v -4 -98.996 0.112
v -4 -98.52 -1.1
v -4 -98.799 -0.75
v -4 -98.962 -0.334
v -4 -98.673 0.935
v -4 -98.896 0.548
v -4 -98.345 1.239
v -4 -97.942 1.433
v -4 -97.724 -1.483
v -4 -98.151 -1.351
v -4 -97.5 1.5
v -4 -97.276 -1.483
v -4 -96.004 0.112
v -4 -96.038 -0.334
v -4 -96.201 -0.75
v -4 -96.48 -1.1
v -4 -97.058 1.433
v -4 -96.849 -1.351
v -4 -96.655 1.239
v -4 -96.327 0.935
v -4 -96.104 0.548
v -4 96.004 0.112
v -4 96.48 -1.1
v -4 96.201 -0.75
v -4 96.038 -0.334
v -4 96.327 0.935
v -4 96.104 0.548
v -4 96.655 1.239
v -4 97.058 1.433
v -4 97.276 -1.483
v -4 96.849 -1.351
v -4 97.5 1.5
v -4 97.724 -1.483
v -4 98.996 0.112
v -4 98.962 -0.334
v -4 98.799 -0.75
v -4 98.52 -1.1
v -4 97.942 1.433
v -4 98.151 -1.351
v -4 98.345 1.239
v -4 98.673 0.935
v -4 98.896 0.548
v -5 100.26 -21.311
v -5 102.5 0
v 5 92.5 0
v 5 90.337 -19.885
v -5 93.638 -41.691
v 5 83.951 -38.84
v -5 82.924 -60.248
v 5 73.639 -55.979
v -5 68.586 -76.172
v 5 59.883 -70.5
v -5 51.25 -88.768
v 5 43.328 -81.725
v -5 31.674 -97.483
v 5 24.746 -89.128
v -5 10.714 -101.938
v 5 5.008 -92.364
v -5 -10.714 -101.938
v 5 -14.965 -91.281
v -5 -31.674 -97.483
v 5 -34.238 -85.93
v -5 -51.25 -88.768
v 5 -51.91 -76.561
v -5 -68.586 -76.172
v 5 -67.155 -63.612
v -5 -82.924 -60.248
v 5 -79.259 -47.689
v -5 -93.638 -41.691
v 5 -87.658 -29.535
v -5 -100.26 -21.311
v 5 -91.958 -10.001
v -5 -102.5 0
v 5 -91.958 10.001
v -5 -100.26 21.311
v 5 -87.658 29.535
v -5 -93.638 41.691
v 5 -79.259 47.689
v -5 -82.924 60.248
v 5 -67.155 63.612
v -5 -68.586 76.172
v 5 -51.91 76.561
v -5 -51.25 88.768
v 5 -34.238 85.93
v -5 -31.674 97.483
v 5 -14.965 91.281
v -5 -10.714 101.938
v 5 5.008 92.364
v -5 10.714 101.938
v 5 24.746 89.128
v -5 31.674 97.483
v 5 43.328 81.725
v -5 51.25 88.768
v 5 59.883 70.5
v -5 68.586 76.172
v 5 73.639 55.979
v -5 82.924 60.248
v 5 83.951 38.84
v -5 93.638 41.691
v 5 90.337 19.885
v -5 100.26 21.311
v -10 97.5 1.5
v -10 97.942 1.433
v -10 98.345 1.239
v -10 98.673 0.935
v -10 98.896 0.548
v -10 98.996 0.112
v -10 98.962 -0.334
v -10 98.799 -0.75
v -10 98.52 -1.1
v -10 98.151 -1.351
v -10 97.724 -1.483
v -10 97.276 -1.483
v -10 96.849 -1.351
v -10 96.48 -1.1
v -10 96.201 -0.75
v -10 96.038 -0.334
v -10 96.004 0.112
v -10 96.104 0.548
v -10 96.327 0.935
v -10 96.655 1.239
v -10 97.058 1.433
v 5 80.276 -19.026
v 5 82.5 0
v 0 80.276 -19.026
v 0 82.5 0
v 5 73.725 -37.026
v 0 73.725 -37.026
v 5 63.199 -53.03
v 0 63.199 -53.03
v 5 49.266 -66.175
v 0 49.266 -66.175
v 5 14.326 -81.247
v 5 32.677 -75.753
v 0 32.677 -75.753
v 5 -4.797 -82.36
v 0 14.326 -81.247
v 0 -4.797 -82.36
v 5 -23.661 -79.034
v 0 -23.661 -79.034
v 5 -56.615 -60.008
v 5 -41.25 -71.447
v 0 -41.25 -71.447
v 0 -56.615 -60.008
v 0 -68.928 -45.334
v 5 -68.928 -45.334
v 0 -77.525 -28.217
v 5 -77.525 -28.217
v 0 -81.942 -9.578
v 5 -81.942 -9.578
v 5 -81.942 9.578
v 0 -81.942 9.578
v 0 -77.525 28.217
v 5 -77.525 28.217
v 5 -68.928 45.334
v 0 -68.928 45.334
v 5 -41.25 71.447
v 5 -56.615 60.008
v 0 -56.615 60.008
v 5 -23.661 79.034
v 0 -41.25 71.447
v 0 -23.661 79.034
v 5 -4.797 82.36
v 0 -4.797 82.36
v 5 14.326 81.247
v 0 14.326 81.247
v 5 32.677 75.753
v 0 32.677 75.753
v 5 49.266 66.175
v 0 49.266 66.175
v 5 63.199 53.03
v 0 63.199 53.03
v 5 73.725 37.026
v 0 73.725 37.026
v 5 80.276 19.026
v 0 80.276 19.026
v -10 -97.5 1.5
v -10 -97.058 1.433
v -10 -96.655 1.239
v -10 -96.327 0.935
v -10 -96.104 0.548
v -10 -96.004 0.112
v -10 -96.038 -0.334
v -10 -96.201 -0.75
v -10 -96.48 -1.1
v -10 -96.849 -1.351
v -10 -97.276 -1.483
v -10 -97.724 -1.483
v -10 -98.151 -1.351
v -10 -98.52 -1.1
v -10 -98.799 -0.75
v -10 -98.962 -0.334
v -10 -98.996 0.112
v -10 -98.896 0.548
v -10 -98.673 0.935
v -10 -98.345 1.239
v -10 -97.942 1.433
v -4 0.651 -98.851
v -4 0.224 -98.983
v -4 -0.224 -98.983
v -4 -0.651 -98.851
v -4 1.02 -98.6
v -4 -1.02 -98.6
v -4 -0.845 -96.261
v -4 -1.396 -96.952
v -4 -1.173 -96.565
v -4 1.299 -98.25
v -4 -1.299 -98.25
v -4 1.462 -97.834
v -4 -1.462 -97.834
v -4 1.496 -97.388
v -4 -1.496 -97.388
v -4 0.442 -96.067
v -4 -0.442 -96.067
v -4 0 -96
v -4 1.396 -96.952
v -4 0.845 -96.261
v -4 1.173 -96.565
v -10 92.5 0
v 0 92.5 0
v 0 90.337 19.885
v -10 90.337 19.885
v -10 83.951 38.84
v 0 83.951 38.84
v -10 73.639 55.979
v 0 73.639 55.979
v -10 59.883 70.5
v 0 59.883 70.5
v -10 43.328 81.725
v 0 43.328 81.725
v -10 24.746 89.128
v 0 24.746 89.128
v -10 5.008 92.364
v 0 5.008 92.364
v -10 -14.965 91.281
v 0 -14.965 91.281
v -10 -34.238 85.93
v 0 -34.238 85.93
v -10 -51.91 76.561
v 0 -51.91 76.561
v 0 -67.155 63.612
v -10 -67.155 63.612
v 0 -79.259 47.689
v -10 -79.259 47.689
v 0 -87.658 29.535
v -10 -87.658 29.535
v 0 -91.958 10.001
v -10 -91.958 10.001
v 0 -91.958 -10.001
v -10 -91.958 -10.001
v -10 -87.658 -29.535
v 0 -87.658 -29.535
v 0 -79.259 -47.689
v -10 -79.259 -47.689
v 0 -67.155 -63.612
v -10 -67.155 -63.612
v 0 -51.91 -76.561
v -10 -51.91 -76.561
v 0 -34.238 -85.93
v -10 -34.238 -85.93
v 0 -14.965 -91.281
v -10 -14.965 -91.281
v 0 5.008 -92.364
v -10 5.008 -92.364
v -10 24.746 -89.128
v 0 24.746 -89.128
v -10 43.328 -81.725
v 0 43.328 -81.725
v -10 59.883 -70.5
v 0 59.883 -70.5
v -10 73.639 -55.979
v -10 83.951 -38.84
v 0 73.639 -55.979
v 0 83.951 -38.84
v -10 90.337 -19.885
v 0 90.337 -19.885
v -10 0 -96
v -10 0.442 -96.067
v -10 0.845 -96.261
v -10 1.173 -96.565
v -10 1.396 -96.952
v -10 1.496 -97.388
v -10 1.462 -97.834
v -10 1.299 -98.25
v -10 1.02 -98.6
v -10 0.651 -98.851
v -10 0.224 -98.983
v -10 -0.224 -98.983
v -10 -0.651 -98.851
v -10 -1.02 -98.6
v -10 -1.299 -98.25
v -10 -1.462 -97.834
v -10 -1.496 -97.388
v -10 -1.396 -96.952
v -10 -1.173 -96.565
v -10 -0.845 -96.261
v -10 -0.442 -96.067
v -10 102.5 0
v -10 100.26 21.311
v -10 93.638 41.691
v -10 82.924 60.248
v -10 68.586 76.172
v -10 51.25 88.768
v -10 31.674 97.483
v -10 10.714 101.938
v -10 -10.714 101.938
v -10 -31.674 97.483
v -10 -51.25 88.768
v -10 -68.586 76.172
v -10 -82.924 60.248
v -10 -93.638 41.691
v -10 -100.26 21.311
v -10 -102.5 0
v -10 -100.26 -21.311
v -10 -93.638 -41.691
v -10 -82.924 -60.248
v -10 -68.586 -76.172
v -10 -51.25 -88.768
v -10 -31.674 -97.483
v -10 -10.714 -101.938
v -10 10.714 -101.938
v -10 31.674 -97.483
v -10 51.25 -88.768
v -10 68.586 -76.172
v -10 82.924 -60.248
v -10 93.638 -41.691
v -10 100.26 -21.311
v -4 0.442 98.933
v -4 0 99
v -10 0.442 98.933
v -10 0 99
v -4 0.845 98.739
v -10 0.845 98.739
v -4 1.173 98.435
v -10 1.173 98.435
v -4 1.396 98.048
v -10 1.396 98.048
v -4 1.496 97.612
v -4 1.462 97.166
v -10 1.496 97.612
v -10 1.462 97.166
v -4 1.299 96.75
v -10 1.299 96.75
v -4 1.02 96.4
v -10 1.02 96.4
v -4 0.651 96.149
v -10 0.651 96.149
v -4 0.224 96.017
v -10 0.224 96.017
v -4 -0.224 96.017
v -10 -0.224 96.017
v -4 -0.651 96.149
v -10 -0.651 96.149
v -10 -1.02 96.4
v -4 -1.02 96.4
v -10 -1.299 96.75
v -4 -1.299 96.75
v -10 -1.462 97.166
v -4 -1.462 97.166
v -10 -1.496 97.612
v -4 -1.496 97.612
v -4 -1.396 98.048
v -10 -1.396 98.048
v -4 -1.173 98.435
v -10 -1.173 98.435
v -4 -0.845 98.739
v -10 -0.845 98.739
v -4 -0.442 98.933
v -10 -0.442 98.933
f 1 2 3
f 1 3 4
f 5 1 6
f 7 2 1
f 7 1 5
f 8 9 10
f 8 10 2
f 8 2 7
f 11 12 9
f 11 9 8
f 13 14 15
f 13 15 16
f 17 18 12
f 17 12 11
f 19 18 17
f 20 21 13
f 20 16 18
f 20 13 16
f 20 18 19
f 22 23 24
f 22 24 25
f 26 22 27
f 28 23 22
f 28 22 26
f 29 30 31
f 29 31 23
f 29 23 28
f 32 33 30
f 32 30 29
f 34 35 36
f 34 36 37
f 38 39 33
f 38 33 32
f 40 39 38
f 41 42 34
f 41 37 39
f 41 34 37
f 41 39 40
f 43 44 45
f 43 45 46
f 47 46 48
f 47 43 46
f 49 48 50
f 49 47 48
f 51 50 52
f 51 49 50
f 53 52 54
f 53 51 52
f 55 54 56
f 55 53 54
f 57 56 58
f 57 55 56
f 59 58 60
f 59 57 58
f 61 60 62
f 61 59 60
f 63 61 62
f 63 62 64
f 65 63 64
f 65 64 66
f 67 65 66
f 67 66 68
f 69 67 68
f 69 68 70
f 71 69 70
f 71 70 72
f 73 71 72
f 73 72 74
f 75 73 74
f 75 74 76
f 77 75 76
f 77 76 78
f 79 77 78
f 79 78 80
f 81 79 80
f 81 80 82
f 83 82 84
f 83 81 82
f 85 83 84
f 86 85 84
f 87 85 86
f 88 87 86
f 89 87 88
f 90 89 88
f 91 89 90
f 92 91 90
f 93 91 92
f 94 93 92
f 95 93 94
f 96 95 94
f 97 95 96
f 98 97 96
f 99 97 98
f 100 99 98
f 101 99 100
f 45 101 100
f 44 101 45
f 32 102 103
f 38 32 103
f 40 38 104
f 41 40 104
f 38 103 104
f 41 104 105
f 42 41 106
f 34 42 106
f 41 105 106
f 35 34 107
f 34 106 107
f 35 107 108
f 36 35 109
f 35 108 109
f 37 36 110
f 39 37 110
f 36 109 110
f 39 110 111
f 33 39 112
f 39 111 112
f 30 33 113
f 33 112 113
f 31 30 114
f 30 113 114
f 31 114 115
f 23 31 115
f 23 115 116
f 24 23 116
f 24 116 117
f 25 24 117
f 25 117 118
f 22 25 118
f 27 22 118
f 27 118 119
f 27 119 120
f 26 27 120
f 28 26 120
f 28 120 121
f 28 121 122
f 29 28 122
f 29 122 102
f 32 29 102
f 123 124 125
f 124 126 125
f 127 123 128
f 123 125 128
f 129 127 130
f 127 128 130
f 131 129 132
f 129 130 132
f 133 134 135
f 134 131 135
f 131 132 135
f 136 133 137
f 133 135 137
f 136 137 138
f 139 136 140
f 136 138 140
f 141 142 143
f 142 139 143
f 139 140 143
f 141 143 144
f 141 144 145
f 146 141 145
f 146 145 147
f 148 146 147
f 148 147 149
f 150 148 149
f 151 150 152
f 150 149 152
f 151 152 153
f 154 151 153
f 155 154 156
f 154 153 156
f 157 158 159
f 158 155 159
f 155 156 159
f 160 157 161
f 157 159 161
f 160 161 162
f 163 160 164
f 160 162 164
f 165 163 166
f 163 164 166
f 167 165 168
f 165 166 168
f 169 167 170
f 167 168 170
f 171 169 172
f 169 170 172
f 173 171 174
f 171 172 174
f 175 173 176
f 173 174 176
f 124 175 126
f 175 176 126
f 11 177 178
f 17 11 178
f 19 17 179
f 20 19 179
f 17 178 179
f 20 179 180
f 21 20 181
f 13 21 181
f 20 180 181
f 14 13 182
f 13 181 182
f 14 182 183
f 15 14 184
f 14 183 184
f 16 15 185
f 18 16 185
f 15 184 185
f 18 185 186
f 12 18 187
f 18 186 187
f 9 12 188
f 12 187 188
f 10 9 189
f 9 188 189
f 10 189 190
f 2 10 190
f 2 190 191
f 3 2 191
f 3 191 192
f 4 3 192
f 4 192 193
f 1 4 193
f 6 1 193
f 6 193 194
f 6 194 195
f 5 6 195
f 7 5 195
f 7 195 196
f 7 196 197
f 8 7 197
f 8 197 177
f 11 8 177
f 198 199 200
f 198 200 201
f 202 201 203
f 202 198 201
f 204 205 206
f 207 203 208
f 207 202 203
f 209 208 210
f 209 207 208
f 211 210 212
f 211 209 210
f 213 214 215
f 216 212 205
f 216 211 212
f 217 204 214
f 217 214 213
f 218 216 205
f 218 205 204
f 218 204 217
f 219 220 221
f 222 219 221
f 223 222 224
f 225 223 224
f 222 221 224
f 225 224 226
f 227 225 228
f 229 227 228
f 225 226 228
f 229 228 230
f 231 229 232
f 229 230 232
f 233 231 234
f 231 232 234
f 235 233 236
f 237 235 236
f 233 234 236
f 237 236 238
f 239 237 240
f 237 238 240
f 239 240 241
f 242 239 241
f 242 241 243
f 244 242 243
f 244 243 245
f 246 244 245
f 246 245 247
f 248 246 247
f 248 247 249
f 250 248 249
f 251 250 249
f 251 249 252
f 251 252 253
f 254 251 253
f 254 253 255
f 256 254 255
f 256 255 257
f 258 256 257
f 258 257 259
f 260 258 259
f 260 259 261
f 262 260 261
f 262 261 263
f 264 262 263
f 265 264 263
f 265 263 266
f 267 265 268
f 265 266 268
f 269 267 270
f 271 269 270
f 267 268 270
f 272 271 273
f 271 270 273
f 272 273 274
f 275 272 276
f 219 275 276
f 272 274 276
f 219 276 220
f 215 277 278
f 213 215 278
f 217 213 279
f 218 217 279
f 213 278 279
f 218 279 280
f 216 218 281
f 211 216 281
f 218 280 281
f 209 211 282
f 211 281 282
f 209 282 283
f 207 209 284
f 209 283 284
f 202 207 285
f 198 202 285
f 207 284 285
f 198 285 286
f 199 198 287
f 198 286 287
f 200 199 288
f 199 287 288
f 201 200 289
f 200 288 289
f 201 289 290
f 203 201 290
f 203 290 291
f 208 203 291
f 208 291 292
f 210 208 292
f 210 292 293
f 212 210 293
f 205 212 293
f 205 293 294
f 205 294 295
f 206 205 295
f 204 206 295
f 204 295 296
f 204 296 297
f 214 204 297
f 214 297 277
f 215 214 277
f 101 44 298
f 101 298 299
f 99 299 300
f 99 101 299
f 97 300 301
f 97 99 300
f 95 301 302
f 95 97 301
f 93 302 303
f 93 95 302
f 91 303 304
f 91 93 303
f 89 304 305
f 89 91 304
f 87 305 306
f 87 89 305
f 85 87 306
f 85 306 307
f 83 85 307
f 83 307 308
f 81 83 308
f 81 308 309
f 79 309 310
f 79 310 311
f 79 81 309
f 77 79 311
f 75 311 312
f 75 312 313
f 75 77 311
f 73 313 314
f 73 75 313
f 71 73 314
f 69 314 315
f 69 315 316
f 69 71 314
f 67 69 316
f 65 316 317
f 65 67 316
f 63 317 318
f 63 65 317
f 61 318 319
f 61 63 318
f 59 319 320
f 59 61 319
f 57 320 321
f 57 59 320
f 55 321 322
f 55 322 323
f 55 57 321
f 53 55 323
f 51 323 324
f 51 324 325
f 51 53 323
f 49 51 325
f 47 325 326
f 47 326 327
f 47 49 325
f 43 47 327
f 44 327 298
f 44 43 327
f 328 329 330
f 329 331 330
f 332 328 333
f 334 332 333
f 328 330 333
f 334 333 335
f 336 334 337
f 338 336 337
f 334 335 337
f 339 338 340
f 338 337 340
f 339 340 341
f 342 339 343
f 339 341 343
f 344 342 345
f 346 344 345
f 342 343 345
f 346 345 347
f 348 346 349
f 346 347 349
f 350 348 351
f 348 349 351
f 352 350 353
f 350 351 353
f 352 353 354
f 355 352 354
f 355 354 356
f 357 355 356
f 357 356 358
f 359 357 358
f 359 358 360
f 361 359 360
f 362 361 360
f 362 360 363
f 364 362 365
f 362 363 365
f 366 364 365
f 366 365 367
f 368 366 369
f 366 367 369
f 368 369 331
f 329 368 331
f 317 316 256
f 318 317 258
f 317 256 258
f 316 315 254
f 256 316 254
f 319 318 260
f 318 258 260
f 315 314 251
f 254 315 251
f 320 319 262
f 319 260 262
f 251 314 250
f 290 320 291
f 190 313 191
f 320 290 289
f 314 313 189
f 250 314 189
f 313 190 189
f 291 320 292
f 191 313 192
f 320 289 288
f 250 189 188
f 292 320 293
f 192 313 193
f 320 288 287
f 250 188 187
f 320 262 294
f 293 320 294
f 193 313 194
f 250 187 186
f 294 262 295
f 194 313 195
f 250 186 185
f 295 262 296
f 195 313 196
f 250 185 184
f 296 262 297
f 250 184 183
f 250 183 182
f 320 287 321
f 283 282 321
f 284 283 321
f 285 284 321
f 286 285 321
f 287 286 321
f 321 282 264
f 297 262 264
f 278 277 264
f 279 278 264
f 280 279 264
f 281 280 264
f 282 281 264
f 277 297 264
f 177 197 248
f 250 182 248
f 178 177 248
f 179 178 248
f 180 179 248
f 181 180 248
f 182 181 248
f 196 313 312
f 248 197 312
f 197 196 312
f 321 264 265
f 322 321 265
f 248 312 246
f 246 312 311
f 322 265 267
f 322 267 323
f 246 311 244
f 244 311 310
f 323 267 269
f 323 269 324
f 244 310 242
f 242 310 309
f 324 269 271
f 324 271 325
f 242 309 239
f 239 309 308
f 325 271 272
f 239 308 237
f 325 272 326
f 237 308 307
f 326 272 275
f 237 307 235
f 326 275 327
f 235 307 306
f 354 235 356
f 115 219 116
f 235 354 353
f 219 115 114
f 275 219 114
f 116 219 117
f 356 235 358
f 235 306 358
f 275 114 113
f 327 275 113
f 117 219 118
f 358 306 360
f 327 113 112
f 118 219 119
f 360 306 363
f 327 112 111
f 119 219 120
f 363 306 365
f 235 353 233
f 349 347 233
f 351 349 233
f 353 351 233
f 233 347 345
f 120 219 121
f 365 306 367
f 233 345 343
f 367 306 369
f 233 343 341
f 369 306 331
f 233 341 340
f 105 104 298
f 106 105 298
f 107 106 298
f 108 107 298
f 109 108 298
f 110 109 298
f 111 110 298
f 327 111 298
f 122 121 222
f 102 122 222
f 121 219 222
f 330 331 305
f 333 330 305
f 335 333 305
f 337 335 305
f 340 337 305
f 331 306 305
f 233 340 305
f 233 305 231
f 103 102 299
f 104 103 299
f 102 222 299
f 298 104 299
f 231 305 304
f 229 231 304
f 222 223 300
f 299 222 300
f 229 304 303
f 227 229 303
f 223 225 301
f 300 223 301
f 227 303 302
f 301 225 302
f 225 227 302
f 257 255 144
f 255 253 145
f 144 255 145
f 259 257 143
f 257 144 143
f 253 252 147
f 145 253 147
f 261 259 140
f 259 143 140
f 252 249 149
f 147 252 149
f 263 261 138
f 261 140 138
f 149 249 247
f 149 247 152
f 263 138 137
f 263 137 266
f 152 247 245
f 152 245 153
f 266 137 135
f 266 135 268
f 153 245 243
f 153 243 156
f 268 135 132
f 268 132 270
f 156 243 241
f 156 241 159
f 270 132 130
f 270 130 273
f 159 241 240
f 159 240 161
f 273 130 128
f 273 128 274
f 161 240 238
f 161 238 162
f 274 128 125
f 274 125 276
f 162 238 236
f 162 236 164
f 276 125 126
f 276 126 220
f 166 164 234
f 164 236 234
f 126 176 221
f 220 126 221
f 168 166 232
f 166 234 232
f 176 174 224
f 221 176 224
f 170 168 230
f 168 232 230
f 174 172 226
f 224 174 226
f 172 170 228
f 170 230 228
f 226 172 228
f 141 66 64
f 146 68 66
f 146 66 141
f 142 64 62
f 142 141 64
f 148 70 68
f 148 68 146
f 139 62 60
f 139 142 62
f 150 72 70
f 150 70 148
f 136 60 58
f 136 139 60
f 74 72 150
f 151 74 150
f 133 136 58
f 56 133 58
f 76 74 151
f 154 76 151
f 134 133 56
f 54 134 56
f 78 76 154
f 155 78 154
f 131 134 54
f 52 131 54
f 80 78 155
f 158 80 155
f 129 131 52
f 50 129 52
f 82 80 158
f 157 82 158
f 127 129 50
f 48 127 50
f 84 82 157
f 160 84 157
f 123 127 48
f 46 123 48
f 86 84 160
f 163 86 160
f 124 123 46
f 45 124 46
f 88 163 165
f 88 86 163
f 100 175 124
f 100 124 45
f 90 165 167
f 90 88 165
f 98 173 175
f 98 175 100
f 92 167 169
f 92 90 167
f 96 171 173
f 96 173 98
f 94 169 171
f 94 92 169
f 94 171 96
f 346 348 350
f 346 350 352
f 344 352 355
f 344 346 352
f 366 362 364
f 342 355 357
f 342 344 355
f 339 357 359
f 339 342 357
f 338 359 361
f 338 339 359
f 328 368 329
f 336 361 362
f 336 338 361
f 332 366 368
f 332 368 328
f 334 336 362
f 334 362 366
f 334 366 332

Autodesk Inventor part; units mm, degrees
ref_plane "YZ Plane" through (0, 0, 0) normal (1, 0, 0) x (0, 1, 0)
ref_plane "XZ Plane" through (0, 0, 0) normal (0, 1, 0) x (-1, 0, 0)
ref_plane "XY Plane" through (0, 0, 0) normal (0, 0, 1) x (1, 0, 0)
sketch "Sketch1" plane through (0, 0, 0) normal (1, 0, 0) x (0, 1, 0)
  circle A0 centre (0, 0) radius 82.5
  circle A1 centre (0, 0) radius 102.5
  circle A2 centre (0, 0) radius 92.5
  dimension "d0" = 165
  dimension "d1" = 20
  dimension "d2" = 10
extrude "Extrusion1" add sketch "Sketch1" along normal blind 5 contours A1 | A2
extrude "Extrusion2" add sketch "Sketch1" against normal blind 10 contours A1
chamfer "Chamfer1" distance 10 angle 45 1 edges at (5, -102.5, 0)
sketch "Sketch2" plane through (-10, 0, 0) normal (-1, 0, 0) x (0, 0, 1)
  circle A0 centre (0, 0) radius 102.5 projected
  circle A1 centre (0, 0) radius 92.5 projected
  circle A2 centre (0, 97.5) radius 1.5
  circle A3 centre (-97.5, 0) radius 1.5
  circle A4 centre (0, -97.5) radius 1.5
  circle A5 centre (97.5, 0) radius 1.5
  dimension "d10" = 3
  dimension "d11" = 97.5
  dimension "d14" = 360
extrude "Extrusion3" cut sketch "Sketch2" against normal blind 6 contours A2 | A3 | A4 | A5
properties part number "CIRCULO_fRONTAL" material "Steel, Mild, Welded"
